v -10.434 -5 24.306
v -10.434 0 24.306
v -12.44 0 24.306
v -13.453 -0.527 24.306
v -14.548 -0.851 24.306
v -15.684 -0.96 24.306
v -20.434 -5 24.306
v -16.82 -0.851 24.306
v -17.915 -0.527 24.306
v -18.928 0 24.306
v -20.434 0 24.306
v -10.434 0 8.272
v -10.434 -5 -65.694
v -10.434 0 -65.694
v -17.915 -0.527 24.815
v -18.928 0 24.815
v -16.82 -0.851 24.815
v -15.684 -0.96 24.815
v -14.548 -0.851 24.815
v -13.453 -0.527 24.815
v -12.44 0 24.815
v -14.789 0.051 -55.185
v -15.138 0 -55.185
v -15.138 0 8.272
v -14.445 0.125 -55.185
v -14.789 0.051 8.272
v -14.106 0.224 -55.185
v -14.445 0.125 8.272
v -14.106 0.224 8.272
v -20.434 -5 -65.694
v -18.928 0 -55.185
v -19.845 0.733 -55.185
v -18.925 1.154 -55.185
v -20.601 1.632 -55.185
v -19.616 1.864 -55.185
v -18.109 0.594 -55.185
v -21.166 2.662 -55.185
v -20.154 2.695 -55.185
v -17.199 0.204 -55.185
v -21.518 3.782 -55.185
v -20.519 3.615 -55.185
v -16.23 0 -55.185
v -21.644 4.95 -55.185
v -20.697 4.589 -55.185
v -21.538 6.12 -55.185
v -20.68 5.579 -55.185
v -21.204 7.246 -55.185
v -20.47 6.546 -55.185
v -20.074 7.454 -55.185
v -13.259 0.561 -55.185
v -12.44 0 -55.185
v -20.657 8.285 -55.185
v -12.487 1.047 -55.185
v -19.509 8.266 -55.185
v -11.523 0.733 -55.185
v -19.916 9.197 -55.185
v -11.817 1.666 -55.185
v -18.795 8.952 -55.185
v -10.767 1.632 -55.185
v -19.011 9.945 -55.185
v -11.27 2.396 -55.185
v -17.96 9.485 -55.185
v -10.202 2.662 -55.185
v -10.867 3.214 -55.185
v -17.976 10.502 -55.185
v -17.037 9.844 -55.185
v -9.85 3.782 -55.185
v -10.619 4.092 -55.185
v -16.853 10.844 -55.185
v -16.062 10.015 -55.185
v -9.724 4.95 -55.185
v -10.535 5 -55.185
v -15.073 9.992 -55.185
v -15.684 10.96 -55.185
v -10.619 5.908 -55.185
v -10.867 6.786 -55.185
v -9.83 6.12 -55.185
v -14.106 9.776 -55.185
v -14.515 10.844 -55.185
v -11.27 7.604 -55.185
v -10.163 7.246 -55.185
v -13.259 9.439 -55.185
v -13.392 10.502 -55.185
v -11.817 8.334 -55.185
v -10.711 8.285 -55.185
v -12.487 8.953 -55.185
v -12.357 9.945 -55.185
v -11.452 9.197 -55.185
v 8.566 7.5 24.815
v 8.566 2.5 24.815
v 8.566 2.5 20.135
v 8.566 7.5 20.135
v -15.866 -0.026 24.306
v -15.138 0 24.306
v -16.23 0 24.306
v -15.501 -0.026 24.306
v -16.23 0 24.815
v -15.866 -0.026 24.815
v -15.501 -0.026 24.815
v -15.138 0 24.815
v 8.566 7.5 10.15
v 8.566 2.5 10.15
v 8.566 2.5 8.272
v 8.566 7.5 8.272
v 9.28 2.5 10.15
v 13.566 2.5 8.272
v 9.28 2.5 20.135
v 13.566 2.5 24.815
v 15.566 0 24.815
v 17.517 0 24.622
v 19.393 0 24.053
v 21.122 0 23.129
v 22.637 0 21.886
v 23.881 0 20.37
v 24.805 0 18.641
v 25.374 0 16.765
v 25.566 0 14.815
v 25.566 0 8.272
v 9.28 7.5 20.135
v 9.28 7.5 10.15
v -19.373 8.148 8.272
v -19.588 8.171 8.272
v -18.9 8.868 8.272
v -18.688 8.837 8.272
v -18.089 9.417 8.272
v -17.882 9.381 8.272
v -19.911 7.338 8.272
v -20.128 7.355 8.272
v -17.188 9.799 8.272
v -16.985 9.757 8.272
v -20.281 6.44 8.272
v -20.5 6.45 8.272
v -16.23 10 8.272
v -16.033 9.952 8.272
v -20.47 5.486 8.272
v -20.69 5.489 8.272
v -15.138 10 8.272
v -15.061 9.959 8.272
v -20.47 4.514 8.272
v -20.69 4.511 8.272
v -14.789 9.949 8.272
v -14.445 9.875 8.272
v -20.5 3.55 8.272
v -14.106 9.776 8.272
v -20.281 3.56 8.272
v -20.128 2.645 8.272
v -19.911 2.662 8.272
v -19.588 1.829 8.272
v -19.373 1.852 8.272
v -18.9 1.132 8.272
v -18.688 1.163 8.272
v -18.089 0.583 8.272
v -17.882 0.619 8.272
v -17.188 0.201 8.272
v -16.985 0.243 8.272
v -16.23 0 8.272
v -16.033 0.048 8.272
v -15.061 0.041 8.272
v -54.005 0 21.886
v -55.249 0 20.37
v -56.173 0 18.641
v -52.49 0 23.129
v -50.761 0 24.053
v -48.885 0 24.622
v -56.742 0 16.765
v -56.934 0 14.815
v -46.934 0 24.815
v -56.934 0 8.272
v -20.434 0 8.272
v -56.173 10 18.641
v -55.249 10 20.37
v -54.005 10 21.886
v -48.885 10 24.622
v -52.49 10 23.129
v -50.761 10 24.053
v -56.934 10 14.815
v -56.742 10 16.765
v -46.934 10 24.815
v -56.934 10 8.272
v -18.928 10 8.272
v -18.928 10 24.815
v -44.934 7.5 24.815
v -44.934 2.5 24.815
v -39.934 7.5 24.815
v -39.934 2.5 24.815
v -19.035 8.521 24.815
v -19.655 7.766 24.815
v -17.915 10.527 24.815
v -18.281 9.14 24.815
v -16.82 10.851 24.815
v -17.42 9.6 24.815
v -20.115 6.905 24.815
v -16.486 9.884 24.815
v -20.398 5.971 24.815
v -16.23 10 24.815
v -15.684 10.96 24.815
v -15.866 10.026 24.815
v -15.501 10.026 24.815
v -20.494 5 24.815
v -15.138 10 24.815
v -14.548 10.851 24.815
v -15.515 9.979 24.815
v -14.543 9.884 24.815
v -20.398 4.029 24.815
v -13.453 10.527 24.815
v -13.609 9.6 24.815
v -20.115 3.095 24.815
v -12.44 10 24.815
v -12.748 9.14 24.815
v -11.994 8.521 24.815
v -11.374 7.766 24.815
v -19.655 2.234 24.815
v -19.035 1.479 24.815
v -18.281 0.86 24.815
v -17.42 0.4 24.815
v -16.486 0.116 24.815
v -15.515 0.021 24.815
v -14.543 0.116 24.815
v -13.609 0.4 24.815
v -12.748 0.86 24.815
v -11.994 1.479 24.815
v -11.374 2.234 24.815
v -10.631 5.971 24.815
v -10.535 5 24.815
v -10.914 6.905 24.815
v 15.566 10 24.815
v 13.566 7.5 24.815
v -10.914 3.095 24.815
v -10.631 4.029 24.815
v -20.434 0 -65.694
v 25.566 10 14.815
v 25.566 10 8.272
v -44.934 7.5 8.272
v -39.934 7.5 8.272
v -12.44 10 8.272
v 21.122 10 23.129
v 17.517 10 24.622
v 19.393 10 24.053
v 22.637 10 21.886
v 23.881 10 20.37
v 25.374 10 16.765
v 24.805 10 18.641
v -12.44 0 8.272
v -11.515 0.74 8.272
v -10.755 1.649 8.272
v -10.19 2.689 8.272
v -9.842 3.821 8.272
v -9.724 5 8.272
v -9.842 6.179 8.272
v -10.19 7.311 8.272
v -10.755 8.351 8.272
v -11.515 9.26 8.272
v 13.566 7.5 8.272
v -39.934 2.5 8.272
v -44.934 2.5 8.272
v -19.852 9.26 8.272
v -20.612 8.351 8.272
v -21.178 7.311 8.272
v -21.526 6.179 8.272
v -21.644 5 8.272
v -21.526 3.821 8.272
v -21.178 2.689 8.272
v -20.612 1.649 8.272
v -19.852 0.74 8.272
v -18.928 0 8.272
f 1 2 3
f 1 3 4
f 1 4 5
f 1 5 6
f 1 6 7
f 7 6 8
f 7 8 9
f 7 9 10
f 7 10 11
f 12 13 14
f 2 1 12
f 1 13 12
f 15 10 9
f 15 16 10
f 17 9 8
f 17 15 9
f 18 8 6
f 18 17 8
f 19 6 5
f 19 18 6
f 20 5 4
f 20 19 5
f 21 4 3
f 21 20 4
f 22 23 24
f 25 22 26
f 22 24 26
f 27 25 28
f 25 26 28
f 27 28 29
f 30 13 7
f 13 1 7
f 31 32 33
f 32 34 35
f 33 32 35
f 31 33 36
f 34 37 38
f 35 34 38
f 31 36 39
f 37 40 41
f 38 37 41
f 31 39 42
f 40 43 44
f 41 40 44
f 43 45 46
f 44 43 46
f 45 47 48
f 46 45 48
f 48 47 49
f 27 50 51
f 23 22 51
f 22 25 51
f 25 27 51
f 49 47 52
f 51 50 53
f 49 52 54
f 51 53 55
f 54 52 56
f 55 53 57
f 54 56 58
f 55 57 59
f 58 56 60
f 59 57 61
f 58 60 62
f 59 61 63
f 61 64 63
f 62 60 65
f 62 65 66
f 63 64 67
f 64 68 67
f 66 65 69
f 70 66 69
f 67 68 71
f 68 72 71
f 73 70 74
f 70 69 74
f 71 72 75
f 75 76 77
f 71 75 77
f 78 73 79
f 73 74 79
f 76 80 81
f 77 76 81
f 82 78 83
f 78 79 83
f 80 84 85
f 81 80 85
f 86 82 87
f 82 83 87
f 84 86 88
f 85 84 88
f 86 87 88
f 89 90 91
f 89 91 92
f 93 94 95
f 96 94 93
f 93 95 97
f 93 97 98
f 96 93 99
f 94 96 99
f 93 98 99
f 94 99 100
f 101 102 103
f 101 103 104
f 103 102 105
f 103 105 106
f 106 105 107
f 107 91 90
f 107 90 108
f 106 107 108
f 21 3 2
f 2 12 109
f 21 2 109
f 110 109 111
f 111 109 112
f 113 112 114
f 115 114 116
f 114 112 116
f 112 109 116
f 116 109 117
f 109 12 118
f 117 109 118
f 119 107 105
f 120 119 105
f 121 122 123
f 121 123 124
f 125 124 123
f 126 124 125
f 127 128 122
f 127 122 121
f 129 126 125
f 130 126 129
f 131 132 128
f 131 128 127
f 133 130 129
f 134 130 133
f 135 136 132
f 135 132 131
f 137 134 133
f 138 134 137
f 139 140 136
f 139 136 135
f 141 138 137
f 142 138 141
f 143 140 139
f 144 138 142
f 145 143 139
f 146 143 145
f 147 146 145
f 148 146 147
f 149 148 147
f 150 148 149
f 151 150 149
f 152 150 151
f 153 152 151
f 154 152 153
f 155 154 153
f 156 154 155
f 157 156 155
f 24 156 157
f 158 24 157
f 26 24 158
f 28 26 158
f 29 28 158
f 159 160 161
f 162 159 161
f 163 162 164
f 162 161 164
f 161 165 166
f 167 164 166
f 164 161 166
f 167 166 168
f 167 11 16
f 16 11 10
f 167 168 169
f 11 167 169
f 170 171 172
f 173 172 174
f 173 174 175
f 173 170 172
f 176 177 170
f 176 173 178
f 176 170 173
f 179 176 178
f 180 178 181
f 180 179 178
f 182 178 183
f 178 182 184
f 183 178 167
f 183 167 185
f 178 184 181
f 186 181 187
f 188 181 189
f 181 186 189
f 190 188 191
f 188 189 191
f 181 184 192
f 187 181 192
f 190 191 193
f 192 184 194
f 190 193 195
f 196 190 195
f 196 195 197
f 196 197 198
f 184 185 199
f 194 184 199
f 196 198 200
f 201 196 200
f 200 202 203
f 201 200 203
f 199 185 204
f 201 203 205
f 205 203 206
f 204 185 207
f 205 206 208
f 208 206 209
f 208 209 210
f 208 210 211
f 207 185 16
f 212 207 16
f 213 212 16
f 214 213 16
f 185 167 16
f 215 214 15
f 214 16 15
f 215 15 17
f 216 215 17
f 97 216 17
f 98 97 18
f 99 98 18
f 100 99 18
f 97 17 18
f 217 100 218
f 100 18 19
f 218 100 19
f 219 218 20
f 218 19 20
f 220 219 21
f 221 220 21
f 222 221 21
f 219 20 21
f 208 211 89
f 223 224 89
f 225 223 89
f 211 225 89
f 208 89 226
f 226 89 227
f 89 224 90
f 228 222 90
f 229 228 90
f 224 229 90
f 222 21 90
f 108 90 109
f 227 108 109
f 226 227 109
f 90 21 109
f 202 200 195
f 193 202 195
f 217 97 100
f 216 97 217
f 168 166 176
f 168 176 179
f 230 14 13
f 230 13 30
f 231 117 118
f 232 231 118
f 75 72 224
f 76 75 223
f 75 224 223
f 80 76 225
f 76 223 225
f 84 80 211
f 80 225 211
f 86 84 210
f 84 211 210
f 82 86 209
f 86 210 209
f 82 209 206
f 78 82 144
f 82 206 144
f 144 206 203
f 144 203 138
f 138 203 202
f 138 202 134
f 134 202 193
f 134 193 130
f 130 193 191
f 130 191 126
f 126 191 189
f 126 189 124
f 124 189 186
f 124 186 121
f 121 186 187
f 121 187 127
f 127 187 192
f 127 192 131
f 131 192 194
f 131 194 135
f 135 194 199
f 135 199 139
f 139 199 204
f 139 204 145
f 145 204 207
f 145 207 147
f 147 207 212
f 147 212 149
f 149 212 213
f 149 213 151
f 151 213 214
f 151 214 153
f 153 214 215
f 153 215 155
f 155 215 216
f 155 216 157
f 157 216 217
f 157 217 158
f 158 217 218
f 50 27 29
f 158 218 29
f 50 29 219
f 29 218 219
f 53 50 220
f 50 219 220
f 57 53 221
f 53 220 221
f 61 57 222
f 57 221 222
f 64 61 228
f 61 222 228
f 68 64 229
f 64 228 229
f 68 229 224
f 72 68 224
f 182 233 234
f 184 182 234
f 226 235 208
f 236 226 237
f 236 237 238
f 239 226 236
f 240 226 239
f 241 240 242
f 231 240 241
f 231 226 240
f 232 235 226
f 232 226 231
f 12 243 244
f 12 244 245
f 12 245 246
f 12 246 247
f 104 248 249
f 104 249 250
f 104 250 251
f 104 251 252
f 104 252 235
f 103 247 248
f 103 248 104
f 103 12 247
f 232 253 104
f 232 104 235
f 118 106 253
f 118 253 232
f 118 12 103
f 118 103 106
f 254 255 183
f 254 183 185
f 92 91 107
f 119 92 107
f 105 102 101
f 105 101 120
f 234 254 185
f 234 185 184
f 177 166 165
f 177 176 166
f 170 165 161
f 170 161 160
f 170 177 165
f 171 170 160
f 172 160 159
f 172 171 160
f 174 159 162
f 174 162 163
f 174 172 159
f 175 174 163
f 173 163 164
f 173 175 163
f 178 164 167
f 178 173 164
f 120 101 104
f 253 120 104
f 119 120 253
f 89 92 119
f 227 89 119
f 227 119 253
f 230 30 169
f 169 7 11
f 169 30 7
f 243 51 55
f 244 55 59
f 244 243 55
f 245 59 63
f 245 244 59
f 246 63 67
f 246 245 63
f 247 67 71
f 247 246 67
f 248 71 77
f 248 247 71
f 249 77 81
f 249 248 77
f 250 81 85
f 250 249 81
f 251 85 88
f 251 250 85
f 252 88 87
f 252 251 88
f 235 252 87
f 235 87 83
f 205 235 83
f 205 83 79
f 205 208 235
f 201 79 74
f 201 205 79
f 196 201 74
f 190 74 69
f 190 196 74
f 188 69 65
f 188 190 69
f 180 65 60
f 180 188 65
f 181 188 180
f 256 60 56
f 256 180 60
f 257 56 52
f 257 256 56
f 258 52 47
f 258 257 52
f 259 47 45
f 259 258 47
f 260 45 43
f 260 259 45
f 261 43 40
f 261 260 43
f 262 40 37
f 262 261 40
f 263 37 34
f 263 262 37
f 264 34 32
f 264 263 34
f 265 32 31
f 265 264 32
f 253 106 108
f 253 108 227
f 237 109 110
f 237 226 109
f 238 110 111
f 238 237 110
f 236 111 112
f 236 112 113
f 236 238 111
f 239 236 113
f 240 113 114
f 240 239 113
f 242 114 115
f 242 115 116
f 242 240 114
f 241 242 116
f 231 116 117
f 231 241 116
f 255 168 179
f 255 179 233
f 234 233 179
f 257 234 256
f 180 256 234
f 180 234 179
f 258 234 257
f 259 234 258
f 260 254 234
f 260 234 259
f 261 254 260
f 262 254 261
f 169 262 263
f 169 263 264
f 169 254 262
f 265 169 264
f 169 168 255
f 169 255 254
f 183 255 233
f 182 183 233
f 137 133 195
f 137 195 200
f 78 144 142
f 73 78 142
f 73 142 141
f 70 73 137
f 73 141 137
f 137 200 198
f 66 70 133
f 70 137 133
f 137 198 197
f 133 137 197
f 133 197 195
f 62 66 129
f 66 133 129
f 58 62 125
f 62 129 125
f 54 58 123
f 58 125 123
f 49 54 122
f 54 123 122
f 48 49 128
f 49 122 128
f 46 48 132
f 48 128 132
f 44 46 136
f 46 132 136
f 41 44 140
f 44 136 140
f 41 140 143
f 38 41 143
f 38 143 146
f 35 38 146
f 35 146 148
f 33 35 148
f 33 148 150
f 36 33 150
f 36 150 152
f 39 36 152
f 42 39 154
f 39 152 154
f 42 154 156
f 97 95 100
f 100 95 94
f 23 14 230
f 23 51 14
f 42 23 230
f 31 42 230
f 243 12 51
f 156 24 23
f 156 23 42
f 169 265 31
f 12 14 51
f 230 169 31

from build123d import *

# Parameters (mm, degrees)
ESQUISSE1_W             = 82.5
ESQUISSE1_H             = 16.543047786
BOSS_EXTRU_1_DEPTH      = 10
CONG_1_R                = 10
ESQUISSE2_W             = 5
ESQUISSE2_H             = 5
ENL_V_MAT_EXTRU_2_DEPTH = 21
ESQUISSE4_W             = 5
ESQUISSE4_H             = 5
ENL_V_MAT_EXTRU_3_DEPTH = 100
ESQUISSE5_R             = 5.960029696
ESQUISSE5_R_2           = 5.029757688
BOSS_EXTRU_4_DEPTH      = 80
ESQUISSE8_R             = 4.979256744
ENL_V_MAT_EXTRU_5_DEPTH = 80
ESQUISSE9_W             = 44.615478915
ESQUISSE9_H             = 9.98536909
BOSS_EXTRU_5_DEPTH      = 10
ESQUISSE10_W            = 10
ESQUISSE10_H            = 10
BOSS_EXTRU_6_DEPTH      = 5
ESQUISSE13_W            = 10
ESQUISSE13_H            = 5
BOSS_EXTRU_7_DEPTH      = 80
ESQUISSE15_R            = 4.979256744
ENL_V_MAT_EXTRU_6_DEPTH = 80


with BuildPart() as part:
    # Esquisse1 → Boss.-Extru.1 (new body)
    with BuildSketch(Plane(origin=(0, 0, 0), x_dir=(1, 0, 0), z_dir=(0, 1, 0))):
        with Locations((-15.683865756, -16.543047786)):
            Rectangle(ESQUISSE1_W, ESQUISSE1_H)
    extrude(amount=BOSS_EXTRU_1_DEPTH)

    # Congé1
    cong_1_edges = [part.edges().sort_by_distance(p)[0] for p in [
        (25.566134244, 5, 24.814571679),
        (-56.933865756, 5, 24.814571679),
    ]]
    fillet(cong_1_edges, radius=CONG_1_R)

    # Esquisse2 → Enlèv. mat.-Extru.2 (cut)
    with BuildSketch(Plane.XY.offset(24.814571679)):
        with Locations((-42.433865756, 5)):
            Rectangle(ESQUISSE2_W, ESQUISSE2_H)
    extrude(amount=-ENL_V_MAT_EXTRU_2_DEPTH, mode=Mode.SUBTRACT)

    # Esquisse4 → Enlèv. mat.-Extru.3 (cut)
    with BuildSketch(Plane.XY.offset(24.814571679)):
        with Locations((11.066134244, 5)):
            Rectangle(ESQUISSE4_W, ESQUISSE4_H)
    extrude(amount=-ENL_V_MAT_EXTRU_3_DEPTH, mode=Mode.SUBTRACT)

    # Esquisse5 → Boss.-Extru.4 (add)
    with BuildSketch(Plane.XY.offset(24.814571679)):
        with Locations((-15.683865756, 5)):
            Circle(ESQUISSE5_R)
        with Locations((-15.683865756, 5)):
            Circle(ESQUISSE5_R_2, mode=Mode.SUBTRACT)
    extrude(amount=-BOSS_EXTRU_4_DEPTH)

    # Esquisse8 → Enlèv. mat.-Extru.5 (cut)
    with BuildSketch(Plane.XY.offset(24.814571679)):
        with Locations((-15.514565948, 5)):
            Circle(ESQUISSE8_R)
    extrude(amount=-ENL_V_MAT_EXTRU_5_DEPTH, mode=Mode.SUBTRACT)

    # Esquisse9 → Boss.-Extru.5 (add)
    with BuildSketch(Plane(origin=(0, 0, 0), x_dir=(1, 0, 0), z_dir=(0, 1, 0))):
        with Locations((-13.028182488, -15.142474607)):
            Rectangle(ESQUISSE9_W, ESQUISSE9_H)
    extrude(amount=BOSS_EXTRU_5_DEPTH)

    # Esquisse10 → Boss.-Extru.6 (add)
    with BuildSketch(Plane(origin=(0, 0, 0), x_dir=(-1, 0, 0), z_dir=(0, -1, 0))):
        with Locations((15.433865756, -19.305846435)):
            Rectangle(ESQUISSE10_W, ESQUISSE10_H)
    extrude(amount=BOSS_EXTRU_6_DEPTH)

    # Esquisse13 → Boss.-Extru.7 (add)
    with BuildSketch(Plane(origin=(0, 0, 14.305846435), x_dir=(-1, 0, 0), z_dir=(0, 0, -1))):
        with Locations((15.433865756, -2.5)):
            Rectangle(ESQUISSE13_W, ESQUISSE13_H)
    extrude(amount=BOSS_EXTRU_7_DEPTH)

    # Esquisse15 → Enlèv. mat.-Extru.6 (cut)
    with BuildSketch(Plane.XY.offset(20.135159152)):
        with Locations((-15.514565948, 5)):
            Circle(ESQUISSE15_R)
    extrude(amount=-ENL_V_MAT_EXTRU_6_DEPTH, mode=Mode.SUBTRACT)


solid = part.part
